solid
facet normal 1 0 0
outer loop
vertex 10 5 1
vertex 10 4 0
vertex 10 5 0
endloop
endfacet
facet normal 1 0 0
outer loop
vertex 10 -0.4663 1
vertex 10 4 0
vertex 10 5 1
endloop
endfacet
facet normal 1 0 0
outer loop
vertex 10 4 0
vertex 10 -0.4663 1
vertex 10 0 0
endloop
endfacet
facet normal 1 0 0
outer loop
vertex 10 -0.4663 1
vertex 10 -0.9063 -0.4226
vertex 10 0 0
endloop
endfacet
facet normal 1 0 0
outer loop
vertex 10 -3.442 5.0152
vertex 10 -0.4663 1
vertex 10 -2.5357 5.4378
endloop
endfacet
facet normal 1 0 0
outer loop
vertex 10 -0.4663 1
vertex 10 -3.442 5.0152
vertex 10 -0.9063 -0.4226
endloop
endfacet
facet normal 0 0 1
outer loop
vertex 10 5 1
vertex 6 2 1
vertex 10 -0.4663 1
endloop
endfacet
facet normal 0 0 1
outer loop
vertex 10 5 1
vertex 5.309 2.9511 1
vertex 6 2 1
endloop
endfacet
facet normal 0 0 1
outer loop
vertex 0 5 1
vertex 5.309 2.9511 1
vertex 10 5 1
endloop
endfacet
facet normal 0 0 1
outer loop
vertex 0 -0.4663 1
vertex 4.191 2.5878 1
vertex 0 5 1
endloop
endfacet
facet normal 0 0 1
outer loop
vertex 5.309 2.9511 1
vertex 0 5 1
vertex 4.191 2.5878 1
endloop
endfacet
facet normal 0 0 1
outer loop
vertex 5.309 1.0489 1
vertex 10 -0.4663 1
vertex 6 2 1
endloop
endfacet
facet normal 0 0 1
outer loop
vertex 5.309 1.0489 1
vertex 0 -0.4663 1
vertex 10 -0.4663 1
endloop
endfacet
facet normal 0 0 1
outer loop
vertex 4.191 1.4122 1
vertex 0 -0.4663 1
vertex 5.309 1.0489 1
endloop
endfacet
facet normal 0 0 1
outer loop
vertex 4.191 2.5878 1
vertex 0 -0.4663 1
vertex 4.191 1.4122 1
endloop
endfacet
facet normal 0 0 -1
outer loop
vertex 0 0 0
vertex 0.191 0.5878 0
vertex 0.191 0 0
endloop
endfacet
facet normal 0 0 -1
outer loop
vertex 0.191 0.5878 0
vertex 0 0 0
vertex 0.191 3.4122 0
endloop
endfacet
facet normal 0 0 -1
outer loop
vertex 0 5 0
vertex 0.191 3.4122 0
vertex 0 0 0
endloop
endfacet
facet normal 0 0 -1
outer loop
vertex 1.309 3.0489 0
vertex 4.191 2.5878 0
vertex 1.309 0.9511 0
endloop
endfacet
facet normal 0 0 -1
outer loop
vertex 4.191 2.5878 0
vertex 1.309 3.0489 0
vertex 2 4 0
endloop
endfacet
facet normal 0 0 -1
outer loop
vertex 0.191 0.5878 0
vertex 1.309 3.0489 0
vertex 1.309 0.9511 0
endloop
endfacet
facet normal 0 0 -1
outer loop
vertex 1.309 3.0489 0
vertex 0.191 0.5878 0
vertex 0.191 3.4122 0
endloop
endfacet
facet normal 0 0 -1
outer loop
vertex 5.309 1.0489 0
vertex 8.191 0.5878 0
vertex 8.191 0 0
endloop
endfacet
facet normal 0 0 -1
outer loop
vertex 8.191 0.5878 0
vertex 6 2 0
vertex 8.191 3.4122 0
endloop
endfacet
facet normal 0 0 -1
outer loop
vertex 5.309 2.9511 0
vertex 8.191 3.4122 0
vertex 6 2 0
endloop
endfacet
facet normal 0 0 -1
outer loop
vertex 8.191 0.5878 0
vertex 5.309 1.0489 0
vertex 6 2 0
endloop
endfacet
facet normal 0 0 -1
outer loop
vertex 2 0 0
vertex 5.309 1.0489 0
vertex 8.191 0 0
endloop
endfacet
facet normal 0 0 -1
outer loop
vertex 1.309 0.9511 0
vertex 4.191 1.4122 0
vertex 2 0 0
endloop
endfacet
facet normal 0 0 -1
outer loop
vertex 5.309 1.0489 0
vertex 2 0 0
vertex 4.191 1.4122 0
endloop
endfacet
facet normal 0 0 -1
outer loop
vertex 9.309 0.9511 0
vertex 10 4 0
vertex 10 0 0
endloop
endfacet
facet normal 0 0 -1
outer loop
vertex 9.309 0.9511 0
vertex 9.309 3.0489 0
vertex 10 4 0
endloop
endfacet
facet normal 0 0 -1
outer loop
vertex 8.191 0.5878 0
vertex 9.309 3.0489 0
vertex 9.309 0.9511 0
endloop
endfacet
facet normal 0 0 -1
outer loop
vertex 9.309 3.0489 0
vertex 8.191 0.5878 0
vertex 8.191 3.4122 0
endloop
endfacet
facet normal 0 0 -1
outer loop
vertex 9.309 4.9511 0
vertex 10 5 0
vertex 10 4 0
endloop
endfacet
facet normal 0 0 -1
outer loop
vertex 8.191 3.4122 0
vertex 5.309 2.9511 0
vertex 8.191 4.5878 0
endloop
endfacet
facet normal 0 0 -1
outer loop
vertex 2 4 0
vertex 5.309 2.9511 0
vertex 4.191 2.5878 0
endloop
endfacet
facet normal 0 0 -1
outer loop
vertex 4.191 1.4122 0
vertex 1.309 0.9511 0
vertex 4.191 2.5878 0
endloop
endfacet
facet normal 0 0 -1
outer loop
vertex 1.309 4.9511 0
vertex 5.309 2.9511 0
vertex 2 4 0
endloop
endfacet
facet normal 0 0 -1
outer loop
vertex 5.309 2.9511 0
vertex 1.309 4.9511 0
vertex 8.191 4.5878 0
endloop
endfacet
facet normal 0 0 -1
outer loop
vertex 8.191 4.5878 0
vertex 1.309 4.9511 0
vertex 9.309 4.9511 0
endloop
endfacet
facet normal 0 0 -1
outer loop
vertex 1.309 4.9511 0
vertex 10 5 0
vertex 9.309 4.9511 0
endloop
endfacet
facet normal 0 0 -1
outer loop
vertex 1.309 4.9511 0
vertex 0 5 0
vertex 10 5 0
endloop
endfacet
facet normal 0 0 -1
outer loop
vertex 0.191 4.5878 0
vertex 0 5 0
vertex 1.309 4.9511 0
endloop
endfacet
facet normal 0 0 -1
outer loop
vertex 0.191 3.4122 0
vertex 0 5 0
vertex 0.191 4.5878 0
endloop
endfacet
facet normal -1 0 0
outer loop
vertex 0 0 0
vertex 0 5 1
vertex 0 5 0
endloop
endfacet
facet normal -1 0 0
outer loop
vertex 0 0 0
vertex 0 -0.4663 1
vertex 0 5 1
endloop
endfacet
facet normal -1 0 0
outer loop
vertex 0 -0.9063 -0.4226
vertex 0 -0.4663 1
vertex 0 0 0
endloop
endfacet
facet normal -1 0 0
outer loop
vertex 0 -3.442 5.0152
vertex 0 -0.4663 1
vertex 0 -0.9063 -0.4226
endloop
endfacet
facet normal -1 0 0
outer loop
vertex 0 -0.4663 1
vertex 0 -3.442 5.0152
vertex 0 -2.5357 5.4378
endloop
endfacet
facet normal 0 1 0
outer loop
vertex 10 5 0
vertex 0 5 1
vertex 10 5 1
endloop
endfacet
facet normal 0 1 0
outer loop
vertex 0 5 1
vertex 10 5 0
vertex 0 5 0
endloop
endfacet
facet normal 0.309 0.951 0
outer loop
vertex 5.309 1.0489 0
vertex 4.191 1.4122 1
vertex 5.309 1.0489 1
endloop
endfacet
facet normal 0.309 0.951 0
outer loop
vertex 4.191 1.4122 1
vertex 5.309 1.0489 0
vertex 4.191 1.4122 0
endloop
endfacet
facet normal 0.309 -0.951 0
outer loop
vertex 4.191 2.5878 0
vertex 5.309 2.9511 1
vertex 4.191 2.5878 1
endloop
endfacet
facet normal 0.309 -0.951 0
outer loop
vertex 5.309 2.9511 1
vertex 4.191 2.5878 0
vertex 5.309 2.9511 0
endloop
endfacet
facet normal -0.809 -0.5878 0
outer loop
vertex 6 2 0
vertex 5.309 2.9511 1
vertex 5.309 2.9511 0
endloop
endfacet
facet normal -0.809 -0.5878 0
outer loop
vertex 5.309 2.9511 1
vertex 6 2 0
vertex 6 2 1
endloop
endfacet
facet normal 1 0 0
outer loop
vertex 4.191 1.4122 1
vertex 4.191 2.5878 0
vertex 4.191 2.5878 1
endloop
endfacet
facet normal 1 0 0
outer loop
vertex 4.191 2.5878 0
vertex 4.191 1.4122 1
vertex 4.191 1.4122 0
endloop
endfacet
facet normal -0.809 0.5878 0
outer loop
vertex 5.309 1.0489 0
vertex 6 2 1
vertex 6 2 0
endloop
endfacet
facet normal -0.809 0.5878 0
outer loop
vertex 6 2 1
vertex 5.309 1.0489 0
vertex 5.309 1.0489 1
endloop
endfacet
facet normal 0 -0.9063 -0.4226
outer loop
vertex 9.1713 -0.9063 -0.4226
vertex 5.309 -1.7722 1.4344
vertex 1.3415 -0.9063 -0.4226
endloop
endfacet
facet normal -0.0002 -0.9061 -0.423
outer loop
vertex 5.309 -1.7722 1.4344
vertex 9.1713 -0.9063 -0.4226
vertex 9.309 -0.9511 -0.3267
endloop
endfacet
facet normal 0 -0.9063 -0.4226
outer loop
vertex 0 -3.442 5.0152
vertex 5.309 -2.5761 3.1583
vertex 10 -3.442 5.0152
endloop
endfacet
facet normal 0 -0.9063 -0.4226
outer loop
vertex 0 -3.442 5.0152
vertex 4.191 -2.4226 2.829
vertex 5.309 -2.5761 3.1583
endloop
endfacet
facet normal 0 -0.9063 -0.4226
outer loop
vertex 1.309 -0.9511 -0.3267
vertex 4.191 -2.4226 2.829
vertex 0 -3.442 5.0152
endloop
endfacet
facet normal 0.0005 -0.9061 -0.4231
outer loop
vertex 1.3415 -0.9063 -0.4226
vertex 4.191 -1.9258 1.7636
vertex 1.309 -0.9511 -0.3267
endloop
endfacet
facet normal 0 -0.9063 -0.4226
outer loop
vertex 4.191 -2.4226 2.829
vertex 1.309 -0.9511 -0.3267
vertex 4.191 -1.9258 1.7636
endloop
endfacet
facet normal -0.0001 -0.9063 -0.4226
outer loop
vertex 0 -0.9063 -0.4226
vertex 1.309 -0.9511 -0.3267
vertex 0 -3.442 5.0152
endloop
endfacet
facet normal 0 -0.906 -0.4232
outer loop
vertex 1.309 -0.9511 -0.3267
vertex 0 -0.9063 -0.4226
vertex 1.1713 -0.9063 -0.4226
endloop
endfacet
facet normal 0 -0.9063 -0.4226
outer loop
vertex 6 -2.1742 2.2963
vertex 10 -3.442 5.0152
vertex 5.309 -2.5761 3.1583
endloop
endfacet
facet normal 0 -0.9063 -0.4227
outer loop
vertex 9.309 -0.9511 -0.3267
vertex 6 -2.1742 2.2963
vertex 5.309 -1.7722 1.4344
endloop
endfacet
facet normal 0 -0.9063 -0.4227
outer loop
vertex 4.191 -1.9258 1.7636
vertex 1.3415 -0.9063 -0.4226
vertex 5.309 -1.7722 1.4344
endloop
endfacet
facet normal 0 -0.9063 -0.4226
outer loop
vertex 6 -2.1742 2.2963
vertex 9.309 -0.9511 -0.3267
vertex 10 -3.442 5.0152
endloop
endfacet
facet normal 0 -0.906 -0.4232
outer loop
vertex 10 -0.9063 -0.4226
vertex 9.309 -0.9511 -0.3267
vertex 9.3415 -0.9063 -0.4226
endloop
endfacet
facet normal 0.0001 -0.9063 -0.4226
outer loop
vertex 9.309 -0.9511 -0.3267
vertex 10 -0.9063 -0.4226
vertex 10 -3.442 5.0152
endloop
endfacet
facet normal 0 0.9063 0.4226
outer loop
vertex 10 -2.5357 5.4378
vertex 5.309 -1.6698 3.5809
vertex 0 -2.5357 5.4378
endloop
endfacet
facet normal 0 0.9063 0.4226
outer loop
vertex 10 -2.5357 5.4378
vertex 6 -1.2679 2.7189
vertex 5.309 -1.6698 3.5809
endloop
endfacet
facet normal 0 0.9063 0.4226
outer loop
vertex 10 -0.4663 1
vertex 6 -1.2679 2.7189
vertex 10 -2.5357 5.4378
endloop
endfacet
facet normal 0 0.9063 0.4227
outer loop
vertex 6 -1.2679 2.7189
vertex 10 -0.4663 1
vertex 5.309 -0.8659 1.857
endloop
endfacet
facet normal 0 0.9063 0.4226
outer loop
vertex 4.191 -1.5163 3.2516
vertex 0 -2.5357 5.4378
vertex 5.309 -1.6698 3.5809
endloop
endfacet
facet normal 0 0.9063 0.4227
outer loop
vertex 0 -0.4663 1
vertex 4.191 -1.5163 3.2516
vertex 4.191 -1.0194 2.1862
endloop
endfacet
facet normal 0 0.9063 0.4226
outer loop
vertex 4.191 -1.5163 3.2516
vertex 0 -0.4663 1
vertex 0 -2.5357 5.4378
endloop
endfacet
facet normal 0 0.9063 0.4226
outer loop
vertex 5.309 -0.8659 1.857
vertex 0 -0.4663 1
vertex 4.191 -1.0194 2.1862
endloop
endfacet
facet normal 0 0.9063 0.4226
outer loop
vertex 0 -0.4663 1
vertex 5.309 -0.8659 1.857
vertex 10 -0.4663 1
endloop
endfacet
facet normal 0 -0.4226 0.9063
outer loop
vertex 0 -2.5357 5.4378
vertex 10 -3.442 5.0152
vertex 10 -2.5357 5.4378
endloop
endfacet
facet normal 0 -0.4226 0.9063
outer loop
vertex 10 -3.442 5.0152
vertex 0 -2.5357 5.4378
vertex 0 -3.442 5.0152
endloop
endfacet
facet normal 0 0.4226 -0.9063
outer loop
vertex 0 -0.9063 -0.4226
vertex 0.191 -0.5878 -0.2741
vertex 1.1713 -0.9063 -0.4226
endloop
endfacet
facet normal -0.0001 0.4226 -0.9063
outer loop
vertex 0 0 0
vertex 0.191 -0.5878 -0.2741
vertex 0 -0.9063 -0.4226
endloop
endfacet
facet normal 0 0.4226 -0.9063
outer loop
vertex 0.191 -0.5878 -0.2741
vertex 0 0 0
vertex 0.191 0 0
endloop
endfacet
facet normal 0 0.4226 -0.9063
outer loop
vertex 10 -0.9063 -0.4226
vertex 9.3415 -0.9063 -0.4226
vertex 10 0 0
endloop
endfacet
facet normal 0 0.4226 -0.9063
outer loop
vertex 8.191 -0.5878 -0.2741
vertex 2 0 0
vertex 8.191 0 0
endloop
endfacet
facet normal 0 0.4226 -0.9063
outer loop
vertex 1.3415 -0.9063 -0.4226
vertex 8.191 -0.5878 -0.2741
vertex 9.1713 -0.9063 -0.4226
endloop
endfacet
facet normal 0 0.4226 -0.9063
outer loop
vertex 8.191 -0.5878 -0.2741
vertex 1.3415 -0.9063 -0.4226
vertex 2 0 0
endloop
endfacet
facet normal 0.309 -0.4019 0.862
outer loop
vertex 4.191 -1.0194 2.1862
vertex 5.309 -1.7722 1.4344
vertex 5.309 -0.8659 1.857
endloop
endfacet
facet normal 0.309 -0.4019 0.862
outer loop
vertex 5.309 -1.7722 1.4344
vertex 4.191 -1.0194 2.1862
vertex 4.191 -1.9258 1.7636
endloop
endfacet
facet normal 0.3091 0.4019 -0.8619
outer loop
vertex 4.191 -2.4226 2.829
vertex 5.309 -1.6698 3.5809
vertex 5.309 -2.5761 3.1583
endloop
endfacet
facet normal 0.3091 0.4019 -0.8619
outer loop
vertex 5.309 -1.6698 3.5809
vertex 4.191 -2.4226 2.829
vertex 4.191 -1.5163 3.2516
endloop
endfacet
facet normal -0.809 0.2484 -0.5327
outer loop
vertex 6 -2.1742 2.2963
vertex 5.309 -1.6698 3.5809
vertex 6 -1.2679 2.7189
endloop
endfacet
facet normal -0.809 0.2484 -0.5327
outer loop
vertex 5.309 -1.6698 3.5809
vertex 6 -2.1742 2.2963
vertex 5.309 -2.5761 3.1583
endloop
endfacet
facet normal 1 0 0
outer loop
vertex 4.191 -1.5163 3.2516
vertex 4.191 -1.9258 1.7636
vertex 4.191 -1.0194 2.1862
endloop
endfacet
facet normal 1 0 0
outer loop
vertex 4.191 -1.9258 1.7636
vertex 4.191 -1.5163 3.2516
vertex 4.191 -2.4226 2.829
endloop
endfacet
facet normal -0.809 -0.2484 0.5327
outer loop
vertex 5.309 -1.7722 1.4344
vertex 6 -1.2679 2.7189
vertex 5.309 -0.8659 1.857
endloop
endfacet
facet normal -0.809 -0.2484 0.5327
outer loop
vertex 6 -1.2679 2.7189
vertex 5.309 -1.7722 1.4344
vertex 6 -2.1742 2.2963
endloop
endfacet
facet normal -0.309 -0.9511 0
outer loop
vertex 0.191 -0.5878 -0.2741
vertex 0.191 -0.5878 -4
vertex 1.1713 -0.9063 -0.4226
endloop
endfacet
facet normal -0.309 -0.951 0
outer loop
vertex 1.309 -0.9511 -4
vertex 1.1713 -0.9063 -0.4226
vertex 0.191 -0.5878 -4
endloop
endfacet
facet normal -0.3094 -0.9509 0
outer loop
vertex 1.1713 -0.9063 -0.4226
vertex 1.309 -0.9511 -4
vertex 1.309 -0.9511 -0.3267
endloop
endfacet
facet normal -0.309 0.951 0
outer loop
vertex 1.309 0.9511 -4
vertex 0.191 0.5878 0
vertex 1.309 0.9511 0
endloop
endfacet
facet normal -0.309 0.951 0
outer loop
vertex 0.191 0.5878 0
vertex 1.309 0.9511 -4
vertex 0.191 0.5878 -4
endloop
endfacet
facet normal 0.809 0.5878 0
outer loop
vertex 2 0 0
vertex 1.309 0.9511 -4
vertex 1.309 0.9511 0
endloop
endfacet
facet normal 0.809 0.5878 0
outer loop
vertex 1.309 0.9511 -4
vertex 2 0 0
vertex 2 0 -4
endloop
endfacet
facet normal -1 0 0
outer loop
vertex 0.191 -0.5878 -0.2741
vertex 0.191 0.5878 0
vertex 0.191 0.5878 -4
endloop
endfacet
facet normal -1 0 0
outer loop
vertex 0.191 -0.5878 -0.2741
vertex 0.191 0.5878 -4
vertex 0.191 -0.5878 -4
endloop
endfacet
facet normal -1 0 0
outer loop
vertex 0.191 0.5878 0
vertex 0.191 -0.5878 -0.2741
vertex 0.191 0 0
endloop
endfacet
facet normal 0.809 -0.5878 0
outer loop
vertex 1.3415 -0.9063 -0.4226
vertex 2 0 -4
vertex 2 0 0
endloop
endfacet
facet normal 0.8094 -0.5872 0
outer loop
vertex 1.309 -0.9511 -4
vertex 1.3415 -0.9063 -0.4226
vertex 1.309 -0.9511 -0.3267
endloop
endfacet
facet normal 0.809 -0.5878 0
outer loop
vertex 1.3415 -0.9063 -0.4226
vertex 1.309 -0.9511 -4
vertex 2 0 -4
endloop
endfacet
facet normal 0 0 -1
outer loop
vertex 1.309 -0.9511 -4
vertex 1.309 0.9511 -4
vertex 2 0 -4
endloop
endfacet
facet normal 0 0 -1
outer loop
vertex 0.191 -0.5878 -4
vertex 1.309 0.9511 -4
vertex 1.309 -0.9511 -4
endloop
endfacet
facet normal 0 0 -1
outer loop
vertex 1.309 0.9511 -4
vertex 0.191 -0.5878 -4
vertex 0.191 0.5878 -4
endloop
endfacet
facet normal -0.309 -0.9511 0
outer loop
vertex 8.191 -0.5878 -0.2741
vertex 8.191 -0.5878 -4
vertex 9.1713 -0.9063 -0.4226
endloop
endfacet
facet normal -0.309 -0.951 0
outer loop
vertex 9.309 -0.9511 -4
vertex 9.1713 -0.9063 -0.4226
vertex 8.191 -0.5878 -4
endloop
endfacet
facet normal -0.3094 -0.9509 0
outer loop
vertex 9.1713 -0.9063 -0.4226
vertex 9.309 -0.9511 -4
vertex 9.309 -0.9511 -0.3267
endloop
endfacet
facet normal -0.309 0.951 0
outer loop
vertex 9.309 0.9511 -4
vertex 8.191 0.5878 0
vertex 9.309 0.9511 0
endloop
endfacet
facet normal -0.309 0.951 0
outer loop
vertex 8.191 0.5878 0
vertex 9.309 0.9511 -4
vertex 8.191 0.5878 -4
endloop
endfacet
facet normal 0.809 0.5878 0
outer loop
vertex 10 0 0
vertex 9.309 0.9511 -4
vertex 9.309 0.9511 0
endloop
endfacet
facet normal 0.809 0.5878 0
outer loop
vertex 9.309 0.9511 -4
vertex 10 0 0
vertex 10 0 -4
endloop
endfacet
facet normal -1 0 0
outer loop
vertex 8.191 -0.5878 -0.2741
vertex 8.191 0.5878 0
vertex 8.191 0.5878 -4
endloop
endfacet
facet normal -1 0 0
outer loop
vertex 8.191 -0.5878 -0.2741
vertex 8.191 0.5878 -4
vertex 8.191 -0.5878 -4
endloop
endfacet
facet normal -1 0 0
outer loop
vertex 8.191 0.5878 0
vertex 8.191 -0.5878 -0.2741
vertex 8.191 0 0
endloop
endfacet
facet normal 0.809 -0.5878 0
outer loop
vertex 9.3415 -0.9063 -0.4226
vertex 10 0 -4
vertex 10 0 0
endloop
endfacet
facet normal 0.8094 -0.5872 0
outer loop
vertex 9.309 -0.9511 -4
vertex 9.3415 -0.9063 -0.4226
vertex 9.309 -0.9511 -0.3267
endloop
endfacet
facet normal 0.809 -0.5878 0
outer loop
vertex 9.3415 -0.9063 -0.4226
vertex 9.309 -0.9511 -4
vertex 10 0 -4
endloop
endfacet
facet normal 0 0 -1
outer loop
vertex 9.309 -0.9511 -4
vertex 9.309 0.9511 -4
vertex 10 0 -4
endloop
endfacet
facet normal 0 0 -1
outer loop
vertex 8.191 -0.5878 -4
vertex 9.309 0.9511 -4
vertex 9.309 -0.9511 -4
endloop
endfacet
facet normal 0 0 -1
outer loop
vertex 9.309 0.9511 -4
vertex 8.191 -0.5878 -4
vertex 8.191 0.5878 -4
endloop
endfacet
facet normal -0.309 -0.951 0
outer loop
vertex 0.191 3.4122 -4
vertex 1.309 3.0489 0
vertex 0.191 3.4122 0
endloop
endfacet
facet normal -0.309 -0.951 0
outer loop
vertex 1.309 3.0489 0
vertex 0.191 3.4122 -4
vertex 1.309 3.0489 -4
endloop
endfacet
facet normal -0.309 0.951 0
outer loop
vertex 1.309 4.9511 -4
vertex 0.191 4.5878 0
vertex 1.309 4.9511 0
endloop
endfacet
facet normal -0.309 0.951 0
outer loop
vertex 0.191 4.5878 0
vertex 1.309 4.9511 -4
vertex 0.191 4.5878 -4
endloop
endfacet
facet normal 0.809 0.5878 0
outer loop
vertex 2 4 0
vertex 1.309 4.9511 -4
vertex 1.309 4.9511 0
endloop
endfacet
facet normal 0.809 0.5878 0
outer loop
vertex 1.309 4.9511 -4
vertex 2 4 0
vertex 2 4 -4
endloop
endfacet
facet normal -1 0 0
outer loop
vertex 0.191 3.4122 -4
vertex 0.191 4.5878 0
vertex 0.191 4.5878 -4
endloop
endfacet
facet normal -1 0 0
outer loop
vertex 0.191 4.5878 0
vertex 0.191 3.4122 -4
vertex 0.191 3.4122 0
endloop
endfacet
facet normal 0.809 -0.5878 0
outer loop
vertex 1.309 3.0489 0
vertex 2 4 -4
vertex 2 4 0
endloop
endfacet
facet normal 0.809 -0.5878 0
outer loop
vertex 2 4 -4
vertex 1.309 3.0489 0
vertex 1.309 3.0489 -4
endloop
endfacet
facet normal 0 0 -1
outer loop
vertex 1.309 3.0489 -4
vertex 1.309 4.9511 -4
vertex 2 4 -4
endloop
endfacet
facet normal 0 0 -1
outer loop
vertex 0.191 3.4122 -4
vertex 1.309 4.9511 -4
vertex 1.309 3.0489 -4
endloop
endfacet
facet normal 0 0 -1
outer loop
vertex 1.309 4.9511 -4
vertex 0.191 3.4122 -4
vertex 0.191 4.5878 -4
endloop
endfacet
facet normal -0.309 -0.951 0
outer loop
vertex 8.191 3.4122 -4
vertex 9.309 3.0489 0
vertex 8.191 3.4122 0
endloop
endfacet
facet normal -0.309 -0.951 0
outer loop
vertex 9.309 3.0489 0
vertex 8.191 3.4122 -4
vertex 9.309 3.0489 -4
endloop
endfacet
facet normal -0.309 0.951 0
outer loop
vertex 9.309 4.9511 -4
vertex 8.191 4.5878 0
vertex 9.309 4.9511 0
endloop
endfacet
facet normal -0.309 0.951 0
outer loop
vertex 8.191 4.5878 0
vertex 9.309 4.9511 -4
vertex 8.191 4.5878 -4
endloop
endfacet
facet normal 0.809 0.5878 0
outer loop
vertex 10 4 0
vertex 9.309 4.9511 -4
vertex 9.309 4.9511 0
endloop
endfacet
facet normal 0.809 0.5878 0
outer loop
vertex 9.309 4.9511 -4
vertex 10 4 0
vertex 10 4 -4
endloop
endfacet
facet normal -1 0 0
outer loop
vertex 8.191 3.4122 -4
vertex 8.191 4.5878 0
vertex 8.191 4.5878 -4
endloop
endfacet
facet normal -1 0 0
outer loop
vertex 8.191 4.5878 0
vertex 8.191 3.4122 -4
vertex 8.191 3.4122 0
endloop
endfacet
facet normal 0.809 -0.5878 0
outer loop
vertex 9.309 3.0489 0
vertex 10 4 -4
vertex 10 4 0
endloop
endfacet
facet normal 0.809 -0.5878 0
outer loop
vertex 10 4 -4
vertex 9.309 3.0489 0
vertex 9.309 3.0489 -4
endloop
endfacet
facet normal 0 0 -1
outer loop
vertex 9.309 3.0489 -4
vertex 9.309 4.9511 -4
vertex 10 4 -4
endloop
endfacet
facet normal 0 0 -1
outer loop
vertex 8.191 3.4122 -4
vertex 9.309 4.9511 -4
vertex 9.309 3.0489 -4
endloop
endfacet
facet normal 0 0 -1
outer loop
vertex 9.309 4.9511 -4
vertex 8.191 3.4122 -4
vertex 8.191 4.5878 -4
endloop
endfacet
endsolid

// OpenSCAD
x = 10;
y = 6;
z = 1;

module bench(x1,y1,z1){
	difference(){
		cube([x1,y1,z1]);
		translate([x1/2,y1/2,0])
		cylinder(h = z1+2, r = 1);
	}
}

module legs(){
	translate([1,0,-4])
	cylinder(h=4, r =1);

	translate([x-1,0,-4])
	cylinder(h=4, r =1);

	translate([1,y-2,-4])
	cylinder(h=4, r =1);

	translate([x-1,y-2,-4])
	cylinder(h=4, r =1);
}

translate([0,-1,0])
bench(x,y,z);
rotate([115,0,0])
bench(x,y,z);
legs();
